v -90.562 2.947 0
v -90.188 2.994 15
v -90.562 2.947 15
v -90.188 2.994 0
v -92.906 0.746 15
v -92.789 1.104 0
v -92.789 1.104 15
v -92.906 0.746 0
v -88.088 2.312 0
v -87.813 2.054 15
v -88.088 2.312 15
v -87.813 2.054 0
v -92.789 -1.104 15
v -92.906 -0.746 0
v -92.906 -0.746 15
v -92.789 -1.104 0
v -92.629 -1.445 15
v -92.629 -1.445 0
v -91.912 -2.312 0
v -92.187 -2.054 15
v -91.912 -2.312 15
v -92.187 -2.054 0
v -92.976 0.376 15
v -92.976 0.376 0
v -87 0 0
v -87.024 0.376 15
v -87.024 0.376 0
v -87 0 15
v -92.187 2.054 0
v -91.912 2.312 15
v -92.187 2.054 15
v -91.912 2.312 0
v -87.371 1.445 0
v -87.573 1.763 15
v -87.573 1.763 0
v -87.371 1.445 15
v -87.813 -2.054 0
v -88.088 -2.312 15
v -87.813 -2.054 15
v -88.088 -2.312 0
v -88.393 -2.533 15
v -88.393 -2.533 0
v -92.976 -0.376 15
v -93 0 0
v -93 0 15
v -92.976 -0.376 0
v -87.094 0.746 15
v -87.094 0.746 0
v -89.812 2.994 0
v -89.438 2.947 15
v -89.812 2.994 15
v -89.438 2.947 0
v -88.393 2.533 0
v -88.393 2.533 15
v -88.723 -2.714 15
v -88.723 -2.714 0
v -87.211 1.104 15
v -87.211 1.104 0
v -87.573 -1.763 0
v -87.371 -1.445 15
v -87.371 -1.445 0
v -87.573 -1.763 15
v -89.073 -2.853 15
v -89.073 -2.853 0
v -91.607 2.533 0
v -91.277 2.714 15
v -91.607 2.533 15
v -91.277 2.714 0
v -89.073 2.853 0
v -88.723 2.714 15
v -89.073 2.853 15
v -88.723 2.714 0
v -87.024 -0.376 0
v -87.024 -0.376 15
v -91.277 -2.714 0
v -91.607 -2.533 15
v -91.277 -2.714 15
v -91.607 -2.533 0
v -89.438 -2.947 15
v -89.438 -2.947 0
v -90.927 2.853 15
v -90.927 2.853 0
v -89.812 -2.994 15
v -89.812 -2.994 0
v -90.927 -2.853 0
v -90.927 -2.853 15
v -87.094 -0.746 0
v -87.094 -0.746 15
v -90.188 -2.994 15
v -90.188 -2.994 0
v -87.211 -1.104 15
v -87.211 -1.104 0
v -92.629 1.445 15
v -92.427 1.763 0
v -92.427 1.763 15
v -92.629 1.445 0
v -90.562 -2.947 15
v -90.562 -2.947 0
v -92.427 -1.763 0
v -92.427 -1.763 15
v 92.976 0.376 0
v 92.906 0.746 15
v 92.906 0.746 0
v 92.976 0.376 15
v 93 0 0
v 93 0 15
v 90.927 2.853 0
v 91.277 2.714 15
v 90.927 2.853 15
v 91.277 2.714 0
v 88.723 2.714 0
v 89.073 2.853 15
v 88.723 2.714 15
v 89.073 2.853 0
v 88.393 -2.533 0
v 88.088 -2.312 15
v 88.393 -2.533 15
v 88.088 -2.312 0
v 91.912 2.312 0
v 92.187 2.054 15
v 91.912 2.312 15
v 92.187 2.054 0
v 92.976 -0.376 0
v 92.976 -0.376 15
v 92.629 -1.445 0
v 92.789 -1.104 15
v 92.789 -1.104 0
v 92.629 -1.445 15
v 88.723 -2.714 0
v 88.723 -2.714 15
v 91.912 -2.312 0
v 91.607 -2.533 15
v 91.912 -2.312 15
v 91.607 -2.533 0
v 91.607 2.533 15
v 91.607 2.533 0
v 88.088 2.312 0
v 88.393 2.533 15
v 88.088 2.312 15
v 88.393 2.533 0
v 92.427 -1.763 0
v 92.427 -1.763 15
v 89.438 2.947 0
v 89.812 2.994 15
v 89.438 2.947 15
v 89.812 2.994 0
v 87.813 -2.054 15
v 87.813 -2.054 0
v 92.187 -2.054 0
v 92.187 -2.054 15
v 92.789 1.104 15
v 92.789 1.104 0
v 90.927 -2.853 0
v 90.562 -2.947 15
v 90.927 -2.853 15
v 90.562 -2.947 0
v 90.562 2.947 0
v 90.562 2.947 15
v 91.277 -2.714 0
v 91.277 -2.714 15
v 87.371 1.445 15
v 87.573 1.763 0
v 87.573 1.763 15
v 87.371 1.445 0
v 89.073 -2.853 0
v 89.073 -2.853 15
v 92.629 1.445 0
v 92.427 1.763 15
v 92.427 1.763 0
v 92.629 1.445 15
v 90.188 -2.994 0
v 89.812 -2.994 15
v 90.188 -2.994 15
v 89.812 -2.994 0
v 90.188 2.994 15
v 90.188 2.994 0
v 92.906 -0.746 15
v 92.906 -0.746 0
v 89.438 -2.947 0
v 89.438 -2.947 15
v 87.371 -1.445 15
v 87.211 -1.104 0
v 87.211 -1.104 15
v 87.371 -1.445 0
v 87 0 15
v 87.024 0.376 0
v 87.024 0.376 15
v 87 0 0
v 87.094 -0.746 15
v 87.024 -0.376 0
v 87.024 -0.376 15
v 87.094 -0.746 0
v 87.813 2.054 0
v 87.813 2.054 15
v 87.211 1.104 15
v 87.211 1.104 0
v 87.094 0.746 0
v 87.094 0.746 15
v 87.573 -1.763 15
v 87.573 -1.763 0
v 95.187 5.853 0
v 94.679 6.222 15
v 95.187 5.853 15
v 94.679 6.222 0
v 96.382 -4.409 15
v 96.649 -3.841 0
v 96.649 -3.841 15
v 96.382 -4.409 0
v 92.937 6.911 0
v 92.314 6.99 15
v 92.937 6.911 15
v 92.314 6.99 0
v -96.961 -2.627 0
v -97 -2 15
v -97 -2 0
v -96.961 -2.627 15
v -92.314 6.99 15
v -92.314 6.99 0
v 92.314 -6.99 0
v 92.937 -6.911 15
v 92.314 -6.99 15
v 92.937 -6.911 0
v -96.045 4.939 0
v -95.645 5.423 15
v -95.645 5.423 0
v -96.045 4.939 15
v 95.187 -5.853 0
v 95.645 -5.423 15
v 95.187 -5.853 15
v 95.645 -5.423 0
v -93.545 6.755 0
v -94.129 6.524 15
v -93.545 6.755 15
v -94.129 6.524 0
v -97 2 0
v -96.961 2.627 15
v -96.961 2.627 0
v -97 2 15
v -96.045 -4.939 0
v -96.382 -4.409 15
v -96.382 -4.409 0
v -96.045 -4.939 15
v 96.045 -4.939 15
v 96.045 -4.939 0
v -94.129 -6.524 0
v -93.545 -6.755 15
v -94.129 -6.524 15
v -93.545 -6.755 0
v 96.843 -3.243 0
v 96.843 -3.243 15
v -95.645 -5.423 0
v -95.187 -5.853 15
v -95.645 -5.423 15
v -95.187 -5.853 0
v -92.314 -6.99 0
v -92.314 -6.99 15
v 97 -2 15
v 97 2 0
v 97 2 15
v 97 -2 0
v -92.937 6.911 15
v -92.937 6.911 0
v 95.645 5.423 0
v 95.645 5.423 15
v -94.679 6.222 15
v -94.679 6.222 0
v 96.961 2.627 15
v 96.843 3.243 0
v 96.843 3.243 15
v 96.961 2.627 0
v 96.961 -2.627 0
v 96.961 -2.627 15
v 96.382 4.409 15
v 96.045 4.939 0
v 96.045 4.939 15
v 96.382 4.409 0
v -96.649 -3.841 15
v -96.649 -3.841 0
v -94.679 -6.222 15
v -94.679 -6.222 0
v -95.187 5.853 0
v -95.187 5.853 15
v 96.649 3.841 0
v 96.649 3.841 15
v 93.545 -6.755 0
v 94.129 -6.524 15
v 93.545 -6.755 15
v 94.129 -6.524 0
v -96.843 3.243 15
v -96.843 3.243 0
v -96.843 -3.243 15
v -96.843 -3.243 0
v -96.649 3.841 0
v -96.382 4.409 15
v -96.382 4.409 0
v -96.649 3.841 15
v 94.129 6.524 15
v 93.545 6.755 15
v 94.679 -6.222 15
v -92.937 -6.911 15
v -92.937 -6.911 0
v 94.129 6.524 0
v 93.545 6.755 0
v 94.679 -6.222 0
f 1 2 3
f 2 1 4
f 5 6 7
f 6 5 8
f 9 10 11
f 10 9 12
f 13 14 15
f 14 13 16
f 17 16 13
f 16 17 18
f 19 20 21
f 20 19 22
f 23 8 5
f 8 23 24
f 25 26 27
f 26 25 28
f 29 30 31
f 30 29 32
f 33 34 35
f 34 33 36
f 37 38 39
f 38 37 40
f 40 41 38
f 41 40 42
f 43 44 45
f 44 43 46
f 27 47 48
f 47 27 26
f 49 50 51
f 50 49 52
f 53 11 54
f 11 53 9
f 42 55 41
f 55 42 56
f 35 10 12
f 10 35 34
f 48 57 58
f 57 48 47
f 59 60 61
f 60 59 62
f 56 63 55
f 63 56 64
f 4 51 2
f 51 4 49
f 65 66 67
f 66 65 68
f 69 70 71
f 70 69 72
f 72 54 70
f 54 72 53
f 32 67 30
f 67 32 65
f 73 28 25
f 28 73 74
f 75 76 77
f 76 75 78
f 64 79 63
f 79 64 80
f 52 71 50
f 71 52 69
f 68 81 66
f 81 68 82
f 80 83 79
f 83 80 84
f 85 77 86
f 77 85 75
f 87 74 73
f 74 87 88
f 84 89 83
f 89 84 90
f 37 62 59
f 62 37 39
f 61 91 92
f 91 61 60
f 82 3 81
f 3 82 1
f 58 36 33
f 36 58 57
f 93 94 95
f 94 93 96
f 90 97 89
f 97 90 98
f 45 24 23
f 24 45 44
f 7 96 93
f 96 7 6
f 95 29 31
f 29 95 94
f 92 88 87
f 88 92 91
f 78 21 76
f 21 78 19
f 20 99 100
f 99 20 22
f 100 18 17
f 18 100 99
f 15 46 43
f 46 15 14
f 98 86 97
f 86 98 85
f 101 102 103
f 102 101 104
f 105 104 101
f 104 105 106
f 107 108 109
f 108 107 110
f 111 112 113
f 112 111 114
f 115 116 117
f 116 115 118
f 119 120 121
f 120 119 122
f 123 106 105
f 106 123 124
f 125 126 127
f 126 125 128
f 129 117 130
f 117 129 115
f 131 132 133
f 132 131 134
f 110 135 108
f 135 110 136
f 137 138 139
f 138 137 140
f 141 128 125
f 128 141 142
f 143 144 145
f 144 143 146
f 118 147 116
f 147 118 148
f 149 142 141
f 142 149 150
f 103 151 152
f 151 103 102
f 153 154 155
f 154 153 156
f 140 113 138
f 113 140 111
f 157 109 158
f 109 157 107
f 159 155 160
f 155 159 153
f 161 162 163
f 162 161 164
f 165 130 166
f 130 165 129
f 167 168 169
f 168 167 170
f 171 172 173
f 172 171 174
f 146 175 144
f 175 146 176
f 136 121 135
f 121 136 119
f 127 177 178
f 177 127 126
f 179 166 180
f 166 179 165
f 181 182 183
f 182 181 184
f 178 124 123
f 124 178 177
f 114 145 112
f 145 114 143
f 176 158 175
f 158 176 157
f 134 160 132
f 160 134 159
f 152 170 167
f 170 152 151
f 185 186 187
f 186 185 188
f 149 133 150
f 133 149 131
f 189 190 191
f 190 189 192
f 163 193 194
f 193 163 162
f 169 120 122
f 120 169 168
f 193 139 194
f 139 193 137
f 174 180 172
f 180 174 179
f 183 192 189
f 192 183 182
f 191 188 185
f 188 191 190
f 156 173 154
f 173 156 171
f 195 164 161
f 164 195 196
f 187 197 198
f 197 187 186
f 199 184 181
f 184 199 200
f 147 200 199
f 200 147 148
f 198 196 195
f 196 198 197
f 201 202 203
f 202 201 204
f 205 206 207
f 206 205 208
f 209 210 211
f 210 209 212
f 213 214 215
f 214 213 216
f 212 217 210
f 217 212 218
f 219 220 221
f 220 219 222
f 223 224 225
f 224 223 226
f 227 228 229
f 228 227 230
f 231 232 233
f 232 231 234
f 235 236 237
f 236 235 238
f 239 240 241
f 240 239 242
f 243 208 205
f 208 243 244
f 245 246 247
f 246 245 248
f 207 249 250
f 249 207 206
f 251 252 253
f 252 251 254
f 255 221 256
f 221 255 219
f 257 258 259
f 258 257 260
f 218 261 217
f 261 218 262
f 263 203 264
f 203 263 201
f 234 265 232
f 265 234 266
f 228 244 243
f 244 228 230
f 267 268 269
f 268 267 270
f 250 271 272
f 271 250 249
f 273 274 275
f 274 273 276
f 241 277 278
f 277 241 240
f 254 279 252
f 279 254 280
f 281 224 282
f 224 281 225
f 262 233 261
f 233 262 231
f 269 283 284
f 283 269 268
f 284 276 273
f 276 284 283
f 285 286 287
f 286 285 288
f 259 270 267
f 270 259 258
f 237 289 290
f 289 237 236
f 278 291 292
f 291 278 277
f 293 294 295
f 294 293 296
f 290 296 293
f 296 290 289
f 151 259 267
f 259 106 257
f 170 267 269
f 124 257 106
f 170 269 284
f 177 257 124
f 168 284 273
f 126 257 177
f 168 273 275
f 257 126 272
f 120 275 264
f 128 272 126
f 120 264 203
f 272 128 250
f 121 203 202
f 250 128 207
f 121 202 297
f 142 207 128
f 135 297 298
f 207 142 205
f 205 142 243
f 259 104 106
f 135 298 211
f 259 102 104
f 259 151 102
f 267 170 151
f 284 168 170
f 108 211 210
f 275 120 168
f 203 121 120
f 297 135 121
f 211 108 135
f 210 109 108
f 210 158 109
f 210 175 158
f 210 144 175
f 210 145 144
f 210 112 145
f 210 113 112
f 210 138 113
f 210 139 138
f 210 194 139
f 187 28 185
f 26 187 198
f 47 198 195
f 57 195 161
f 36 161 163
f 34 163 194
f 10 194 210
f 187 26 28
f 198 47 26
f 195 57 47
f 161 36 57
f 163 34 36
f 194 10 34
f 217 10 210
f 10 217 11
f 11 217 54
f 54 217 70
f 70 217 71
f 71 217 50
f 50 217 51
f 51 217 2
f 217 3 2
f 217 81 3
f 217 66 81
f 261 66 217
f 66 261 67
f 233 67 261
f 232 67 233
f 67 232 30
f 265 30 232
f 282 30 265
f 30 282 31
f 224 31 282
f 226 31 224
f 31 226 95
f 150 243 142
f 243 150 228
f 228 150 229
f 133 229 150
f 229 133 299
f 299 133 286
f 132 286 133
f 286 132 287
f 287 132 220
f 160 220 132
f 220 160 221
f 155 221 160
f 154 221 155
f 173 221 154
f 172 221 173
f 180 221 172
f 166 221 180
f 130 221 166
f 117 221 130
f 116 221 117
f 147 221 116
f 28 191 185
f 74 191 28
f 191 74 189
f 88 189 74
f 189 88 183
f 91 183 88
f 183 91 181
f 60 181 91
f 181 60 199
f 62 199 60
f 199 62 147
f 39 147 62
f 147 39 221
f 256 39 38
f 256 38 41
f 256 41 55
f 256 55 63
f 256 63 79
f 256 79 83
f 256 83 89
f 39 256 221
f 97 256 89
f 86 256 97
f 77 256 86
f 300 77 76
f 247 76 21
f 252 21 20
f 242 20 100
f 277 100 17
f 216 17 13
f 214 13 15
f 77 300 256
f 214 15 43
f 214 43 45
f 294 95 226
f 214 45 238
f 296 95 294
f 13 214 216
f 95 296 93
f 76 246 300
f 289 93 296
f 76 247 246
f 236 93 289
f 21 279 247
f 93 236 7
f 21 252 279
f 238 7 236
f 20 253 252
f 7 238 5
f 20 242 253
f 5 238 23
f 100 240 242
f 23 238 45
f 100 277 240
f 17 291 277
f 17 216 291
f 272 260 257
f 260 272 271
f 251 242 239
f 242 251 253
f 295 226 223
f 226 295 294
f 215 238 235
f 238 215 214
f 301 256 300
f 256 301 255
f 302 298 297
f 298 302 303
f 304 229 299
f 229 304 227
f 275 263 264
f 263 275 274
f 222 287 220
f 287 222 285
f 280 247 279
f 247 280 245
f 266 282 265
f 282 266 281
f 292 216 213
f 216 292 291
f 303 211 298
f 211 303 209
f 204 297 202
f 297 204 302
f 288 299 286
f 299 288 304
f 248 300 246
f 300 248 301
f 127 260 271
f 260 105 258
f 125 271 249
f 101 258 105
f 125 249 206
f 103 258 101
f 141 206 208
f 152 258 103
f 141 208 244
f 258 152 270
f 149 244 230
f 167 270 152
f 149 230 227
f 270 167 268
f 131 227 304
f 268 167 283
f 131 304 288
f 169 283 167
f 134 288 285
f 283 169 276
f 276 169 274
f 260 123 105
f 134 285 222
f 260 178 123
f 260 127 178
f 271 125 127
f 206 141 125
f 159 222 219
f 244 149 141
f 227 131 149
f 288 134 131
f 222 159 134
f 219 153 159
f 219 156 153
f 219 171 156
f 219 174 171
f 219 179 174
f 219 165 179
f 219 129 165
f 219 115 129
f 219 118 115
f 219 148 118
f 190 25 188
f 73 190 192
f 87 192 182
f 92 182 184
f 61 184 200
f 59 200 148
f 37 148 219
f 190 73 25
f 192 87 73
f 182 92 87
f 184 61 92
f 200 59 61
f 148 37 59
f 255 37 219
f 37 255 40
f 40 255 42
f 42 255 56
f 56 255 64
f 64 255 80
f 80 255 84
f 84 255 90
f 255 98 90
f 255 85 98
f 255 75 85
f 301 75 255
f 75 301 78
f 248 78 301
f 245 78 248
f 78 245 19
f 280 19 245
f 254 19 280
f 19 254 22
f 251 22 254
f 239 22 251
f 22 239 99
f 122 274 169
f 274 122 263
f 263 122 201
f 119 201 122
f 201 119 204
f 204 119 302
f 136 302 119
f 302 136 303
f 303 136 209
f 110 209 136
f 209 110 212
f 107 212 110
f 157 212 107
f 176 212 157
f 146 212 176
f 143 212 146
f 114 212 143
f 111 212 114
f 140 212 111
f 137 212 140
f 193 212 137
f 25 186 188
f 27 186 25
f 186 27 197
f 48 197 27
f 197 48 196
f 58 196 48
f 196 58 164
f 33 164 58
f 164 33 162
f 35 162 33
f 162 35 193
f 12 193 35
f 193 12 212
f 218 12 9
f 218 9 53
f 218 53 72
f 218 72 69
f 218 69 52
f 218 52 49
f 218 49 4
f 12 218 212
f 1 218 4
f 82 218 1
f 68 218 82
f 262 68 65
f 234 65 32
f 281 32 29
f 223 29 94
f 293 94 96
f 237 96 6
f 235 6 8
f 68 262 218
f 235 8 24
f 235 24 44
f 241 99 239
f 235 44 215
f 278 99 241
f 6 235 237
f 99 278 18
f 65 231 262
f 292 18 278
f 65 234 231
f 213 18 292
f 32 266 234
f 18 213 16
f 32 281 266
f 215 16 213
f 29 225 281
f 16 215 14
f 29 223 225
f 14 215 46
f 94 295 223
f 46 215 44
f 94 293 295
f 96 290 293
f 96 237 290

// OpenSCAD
$fn = 50;


difference() {
	union() {
		hull() {
			translate(v = [-92.0000000000, 2.0000000000, 0]) {
				cylinder(h = 15, r = 5);
			}
			translate(v = [92.0000000000, 2.0000000000, 0]) {
				cylinder(h = 15, r = 5);
			}
			translate(v = [-92.0000000000, -2.0000000000, 0]) {
				cylinder(h = 15, r = 5);
			}
			translate(v = [92.0000000000, -2.0000000000, 0]) {
				cylinder(h = 15, r = 5);
			}
		}
	}
	union() {
		translate(v = [-90.0000000000, 0.0000000000, -100.0000000000]) {
			cylinder(h = 200, r = 3.0000000000);
		}
		translate(v = [-90.0000000000, 0.0000000000, -100.0000000000]) {
			cylinder(h = 200, r = 3.0000000000);
		}
		translate(v = [90.0000000000, 0.0000000000, -100.0000000000]) {
			cylinder(h = 200, r = 3.0000000000);
		}
		translate(v = [90.0000000000, 0.0000000000, -100.0000000000]) {
			cylinder(h = 200, r = 3.0000000000);
		}
	}
}
